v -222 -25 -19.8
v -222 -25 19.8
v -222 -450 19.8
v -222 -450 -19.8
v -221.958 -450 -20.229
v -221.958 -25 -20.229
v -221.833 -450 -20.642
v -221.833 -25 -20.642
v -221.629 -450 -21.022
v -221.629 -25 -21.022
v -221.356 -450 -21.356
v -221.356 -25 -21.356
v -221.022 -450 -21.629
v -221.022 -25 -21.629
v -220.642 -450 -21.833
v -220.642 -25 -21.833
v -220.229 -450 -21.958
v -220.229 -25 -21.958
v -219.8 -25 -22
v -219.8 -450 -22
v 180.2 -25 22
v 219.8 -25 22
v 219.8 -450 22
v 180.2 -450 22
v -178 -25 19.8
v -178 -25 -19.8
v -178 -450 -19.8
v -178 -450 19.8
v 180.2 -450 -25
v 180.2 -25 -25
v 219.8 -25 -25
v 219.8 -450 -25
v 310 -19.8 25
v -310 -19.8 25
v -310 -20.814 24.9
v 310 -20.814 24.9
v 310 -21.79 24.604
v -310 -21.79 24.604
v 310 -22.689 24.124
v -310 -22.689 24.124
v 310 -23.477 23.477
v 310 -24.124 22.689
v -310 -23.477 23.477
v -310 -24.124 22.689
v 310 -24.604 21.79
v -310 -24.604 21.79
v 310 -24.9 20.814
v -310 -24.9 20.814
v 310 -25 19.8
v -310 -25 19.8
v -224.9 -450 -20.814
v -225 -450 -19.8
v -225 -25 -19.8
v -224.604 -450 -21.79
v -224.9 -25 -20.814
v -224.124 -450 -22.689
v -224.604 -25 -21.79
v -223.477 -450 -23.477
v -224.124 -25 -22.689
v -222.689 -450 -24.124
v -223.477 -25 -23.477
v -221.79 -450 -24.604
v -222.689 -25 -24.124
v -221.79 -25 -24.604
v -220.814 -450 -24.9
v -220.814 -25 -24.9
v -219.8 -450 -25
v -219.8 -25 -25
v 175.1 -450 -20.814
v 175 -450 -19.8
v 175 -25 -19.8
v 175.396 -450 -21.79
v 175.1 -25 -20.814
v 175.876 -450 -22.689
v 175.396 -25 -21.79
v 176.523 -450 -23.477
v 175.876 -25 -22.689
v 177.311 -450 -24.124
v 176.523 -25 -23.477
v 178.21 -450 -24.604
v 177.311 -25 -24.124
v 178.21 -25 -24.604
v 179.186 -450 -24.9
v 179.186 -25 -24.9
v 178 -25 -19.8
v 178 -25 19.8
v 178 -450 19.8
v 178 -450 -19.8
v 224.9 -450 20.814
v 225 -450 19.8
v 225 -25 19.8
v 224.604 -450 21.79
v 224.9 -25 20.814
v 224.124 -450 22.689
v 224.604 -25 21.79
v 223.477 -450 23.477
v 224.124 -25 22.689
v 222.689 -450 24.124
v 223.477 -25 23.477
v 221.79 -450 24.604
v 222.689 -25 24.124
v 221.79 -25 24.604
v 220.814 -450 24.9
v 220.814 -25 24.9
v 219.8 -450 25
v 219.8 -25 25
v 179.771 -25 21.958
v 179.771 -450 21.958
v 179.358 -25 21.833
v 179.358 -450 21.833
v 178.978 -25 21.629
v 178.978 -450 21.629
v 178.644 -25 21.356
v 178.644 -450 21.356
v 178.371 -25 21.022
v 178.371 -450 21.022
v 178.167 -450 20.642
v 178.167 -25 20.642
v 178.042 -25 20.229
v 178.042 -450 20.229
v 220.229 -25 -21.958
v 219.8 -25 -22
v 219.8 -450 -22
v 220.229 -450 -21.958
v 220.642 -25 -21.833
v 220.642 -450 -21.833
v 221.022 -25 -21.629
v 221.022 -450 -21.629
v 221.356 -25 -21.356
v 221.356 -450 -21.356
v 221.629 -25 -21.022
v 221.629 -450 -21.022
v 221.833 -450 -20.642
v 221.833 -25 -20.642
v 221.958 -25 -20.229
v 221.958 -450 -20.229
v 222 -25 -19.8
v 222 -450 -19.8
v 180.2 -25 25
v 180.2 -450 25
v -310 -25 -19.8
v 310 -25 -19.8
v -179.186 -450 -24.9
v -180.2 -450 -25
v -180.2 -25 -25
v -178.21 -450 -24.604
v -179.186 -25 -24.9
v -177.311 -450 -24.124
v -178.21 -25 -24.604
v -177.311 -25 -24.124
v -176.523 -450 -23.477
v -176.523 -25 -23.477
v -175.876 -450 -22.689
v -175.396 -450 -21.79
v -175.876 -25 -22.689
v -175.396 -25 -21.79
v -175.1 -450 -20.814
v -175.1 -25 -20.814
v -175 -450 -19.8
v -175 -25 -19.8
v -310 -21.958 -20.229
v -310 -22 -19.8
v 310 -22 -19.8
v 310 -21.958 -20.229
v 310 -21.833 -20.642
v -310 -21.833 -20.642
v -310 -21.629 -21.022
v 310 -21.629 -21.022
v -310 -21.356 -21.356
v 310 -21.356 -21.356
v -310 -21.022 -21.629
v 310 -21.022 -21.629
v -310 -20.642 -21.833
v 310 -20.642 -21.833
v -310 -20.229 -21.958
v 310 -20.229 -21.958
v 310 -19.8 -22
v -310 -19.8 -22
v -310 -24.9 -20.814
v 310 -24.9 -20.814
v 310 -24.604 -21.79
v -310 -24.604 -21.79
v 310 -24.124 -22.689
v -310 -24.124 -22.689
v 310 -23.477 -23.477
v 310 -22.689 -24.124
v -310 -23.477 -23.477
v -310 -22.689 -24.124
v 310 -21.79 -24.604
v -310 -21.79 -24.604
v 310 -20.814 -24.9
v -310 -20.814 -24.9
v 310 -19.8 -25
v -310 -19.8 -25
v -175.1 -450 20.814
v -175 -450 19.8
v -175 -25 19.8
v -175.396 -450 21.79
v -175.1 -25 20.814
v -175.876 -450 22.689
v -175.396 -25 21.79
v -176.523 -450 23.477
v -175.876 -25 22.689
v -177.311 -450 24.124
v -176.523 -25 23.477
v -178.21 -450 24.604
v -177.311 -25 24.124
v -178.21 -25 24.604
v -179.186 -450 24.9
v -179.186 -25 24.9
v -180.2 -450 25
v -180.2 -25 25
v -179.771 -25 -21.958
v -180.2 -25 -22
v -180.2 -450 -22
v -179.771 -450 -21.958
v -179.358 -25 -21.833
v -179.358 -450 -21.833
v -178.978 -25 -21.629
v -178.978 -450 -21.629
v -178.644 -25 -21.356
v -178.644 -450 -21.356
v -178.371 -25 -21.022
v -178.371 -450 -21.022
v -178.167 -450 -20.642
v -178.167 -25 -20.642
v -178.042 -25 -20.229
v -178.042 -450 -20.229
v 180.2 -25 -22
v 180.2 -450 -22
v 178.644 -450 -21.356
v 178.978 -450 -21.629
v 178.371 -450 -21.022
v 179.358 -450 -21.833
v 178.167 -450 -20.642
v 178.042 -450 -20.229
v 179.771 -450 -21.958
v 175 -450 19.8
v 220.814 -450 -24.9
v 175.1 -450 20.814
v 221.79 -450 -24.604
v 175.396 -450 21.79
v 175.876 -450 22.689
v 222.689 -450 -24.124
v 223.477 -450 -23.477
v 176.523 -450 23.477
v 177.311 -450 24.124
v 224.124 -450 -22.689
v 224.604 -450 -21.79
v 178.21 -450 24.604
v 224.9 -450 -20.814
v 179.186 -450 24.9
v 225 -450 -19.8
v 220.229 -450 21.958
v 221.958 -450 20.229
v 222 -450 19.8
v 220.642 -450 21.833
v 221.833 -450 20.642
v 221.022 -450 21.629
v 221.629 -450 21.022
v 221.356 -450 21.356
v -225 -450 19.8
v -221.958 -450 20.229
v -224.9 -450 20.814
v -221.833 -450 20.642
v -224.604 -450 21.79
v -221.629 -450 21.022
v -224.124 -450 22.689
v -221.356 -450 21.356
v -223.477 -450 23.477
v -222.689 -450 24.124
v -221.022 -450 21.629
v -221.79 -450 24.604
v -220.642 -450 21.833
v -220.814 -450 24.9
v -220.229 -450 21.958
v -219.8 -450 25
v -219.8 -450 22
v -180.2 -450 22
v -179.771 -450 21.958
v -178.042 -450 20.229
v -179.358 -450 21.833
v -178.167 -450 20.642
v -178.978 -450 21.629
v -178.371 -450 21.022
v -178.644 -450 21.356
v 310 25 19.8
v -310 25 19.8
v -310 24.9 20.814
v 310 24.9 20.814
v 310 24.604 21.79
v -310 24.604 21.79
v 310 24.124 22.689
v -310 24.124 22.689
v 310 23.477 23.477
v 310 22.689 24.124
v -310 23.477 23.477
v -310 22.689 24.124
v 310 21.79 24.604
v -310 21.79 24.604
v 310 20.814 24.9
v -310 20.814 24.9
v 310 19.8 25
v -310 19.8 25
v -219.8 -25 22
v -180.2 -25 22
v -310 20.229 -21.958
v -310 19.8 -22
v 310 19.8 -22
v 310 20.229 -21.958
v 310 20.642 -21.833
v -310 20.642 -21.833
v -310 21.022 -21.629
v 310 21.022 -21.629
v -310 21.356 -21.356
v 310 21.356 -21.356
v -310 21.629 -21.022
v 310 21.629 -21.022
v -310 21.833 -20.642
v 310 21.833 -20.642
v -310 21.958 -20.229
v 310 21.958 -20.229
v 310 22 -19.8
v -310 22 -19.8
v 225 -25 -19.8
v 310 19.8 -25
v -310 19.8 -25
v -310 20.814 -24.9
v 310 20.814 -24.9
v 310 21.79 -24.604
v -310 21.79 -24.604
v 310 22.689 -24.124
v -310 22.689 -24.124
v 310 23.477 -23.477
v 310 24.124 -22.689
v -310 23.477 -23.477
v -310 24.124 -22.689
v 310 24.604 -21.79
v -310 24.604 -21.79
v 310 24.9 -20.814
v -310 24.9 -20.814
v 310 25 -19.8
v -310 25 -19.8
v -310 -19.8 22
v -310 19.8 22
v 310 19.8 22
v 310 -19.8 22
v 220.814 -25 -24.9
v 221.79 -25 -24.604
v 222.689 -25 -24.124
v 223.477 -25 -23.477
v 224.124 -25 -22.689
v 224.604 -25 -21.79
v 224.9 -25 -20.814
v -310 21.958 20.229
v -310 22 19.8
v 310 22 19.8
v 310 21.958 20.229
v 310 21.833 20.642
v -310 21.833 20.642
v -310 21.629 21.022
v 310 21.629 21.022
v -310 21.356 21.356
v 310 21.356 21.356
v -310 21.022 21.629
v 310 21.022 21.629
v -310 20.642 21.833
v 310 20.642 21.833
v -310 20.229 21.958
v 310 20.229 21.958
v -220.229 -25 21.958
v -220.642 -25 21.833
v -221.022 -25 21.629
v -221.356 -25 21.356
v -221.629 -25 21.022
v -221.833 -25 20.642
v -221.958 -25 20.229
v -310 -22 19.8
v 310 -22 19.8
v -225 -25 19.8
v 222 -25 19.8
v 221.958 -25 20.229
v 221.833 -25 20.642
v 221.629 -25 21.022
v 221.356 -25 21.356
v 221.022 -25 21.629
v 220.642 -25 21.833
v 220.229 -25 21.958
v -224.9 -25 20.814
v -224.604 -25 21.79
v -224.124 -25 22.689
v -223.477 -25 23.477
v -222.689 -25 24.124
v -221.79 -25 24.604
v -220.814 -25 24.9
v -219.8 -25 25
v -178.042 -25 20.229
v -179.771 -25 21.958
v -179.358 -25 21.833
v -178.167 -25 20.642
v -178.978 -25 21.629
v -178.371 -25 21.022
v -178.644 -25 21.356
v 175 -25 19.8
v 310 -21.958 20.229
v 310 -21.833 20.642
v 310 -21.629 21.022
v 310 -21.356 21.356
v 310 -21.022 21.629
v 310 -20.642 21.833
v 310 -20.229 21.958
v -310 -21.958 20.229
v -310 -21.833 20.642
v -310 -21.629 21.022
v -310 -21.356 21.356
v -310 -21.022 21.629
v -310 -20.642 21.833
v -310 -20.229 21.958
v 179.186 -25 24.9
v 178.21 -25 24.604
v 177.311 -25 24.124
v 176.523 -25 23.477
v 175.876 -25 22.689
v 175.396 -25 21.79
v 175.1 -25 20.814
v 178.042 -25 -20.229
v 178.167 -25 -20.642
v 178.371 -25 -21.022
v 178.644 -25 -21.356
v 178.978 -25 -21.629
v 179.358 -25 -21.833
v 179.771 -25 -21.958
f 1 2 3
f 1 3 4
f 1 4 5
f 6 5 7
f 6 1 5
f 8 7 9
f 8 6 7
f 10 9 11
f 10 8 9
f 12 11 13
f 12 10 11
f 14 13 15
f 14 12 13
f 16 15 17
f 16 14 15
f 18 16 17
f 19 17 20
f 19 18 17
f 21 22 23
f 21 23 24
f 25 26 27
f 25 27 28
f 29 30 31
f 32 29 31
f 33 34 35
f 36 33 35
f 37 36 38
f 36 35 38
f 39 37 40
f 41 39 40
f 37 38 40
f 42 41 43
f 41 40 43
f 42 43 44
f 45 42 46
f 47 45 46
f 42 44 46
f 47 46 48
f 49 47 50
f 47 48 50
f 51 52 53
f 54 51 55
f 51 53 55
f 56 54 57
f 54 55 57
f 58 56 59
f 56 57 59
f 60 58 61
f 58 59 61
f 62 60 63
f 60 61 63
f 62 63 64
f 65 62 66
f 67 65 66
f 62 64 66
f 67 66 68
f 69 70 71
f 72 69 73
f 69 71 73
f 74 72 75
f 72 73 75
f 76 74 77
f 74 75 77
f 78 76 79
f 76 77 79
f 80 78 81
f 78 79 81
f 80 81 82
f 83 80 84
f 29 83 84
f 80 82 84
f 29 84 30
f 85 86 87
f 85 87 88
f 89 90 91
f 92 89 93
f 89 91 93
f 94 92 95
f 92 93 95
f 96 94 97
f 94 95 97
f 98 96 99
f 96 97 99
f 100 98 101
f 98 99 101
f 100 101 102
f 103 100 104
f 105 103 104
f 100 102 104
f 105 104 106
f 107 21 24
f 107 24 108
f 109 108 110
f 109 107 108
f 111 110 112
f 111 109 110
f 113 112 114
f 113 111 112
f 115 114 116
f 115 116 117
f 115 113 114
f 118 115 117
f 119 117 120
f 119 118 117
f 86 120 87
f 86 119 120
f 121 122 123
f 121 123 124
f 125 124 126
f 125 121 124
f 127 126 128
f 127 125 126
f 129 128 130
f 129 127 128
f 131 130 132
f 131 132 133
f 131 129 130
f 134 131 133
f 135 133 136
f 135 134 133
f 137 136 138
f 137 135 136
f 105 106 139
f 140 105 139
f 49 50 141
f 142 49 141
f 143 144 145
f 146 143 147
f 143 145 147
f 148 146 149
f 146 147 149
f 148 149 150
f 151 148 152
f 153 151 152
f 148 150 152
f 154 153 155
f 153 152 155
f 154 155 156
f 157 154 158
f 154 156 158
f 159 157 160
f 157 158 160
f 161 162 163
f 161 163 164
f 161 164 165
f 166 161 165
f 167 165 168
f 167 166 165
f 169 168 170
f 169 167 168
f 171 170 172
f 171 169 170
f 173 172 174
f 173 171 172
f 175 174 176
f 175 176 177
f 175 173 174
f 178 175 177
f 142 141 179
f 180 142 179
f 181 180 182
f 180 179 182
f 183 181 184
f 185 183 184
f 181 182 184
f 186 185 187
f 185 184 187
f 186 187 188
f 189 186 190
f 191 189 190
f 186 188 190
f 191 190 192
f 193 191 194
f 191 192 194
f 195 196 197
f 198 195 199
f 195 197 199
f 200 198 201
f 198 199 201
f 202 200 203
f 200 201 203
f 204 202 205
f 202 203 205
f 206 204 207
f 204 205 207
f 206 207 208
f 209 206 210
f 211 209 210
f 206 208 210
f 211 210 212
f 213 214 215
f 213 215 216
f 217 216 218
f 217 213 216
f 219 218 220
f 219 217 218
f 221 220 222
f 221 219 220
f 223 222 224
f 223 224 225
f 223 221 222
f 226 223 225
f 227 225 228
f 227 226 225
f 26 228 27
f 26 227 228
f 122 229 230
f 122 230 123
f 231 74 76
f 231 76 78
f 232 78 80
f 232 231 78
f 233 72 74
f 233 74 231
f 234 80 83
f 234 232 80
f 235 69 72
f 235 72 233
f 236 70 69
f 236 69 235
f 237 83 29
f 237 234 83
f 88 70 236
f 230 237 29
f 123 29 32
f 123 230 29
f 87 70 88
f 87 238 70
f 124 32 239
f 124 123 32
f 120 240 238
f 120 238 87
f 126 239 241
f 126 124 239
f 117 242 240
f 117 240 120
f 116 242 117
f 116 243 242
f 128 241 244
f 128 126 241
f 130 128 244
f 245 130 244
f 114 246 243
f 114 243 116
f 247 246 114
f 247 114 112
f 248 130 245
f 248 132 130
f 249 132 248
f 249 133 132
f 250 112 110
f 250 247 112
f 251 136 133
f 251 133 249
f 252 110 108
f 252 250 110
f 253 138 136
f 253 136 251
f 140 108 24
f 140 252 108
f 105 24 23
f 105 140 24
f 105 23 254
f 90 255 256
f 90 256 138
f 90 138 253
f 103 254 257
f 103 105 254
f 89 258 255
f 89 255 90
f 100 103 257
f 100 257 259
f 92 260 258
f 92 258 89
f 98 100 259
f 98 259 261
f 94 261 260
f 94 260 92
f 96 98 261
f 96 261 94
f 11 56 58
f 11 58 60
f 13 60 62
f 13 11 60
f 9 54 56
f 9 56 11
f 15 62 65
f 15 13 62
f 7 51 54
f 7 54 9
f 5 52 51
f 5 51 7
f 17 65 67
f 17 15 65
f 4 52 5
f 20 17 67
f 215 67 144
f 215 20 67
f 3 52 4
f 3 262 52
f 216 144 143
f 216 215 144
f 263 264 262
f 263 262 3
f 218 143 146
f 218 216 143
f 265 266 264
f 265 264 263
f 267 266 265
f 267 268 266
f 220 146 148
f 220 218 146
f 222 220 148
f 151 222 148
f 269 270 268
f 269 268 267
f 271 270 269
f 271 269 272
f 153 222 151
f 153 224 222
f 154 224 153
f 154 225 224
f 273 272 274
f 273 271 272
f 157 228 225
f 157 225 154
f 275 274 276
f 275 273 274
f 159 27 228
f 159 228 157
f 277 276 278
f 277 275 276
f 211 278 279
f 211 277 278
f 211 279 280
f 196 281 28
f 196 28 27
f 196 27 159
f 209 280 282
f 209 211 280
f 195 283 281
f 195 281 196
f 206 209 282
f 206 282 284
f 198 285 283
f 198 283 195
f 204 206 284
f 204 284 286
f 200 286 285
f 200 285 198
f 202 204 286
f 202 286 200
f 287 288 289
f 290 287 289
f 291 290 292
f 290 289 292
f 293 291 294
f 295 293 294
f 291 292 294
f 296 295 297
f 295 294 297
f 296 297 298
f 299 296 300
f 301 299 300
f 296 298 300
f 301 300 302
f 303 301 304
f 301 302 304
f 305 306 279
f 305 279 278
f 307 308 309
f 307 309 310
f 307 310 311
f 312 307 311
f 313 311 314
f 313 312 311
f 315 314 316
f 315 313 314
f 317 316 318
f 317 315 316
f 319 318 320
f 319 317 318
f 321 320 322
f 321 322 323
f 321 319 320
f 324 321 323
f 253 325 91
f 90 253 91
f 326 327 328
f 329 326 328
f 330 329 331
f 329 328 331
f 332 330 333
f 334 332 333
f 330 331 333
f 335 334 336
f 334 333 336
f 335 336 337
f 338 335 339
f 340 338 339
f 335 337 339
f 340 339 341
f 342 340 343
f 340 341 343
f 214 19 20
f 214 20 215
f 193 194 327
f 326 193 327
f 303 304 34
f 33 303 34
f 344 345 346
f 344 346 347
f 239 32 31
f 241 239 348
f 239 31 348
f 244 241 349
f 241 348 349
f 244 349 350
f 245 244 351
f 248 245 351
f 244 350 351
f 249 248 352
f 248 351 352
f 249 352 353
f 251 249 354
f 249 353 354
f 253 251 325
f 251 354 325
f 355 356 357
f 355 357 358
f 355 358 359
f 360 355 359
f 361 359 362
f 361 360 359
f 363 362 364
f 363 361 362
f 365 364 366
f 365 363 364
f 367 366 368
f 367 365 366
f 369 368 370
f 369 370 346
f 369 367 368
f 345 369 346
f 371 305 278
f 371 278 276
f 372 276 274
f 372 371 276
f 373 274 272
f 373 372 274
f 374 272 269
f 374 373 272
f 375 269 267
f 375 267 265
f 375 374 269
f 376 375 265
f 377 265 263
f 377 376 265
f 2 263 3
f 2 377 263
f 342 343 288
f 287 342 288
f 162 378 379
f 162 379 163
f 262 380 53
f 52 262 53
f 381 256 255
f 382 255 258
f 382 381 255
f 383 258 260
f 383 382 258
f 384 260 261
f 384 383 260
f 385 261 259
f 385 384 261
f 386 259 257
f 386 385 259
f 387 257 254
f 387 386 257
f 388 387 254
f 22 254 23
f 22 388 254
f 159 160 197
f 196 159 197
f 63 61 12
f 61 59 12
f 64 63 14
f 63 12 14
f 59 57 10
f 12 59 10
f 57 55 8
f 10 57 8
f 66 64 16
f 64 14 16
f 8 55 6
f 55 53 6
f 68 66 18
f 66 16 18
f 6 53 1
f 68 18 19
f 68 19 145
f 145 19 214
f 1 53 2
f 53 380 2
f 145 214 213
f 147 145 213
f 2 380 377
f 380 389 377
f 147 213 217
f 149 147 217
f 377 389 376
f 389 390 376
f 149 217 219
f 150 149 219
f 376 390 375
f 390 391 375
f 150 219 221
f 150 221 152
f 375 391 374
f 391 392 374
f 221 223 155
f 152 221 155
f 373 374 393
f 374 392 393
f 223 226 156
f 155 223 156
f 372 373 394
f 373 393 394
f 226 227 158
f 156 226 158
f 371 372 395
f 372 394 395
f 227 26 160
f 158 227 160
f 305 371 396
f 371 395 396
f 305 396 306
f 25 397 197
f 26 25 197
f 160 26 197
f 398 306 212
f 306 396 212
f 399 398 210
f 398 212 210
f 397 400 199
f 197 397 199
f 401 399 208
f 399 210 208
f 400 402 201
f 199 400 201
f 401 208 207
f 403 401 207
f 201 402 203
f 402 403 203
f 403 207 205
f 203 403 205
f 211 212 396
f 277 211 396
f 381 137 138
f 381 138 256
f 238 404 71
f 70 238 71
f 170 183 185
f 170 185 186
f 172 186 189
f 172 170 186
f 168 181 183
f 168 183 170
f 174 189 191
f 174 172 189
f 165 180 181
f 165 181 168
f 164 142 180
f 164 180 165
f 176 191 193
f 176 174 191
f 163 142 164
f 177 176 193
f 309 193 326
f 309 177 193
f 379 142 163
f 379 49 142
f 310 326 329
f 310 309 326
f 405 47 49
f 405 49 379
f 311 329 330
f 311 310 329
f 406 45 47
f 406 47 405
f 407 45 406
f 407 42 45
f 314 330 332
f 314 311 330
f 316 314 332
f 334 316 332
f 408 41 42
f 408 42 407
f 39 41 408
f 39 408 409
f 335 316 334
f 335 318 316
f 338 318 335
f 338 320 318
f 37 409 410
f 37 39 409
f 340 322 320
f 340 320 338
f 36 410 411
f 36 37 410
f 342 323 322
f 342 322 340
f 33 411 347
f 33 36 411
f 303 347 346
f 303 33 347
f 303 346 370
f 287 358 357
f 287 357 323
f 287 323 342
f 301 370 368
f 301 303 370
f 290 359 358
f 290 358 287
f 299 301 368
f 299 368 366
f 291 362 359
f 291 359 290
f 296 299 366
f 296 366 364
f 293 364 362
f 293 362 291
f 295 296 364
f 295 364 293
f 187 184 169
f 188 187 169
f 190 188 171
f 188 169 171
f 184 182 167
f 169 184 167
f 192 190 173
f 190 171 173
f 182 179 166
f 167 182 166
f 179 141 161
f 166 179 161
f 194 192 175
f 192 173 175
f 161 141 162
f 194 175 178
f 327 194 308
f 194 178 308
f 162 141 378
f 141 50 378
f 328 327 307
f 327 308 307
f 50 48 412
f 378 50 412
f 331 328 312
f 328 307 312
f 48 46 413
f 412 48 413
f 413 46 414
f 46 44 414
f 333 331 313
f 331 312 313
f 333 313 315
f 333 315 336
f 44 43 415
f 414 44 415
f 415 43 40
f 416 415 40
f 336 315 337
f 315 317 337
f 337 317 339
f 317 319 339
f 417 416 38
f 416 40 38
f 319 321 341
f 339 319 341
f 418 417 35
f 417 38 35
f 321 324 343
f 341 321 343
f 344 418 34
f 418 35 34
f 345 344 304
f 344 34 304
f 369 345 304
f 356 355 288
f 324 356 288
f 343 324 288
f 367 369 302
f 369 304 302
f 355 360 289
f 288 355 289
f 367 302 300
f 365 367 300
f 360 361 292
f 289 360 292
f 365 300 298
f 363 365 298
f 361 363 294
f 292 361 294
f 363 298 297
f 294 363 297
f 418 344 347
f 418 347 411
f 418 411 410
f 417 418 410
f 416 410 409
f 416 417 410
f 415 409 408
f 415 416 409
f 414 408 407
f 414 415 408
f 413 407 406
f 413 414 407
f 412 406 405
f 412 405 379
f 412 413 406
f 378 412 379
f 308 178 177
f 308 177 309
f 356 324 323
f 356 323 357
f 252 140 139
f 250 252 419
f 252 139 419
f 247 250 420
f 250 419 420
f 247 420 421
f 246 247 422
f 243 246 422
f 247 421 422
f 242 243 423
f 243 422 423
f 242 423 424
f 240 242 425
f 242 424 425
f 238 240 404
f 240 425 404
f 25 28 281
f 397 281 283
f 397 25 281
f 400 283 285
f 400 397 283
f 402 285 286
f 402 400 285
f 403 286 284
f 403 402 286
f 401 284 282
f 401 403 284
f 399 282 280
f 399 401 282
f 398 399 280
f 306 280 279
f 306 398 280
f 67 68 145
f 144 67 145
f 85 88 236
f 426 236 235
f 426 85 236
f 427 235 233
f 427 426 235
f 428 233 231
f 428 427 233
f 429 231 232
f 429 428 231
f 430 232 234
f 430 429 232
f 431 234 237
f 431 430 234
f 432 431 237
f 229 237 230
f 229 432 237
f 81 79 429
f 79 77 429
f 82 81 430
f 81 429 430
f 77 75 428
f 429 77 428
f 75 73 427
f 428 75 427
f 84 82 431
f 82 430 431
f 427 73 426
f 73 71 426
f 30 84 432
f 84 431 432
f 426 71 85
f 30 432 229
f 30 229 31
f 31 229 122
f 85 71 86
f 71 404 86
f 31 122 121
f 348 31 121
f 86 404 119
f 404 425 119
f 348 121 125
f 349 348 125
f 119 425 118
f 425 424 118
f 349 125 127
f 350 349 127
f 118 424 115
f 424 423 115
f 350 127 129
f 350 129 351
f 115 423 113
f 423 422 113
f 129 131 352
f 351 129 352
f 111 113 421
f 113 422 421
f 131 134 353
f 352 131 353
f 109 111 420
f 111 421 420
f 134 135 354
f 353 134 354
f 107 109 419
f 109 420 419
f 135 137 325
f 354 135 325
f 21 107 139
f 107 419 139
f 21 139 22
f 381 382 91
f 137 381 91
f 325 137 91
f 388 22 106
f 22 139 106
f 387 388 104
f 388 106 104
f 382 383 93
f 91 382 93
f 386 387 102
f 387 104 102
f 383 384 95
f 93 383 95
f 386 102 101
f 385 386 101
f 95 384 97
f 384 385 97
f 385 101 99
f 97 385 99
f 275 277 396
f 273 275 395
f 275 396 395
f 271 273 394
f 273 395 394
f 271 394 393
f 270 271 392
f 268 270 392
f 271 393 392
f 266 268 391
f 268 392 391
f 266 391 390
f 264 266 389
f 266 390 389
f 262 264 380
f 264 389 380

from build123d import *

# Parameters (mm, degrees)
F_50X50XT2_50_X_30_X_2_6_1_DEPTH   = 620
F_50X50XT2_50_X_30_X_2_6_1_2_DEPTH = 451
F_50X50XT2_50_X_30_X_2_6_1_3_DEPTH = 451


with BuildPart() as part:
    # Sketch17 → 50x50xt2 50 X 30 X 2.6(1) (new body)
    with BuildSketch(Plane.YZ.offset(-310)):
        with BuildLine():
            Line((-19.8, -25), (19.8, -25))
            ThreePointArc((19.8, -25), (23.476955262, -23.476955262), (25, -19.8))
            Line((25, -19.8), (25, 19.8))
            ThreePointArc((25, 19.8), (23.476955262, 23.476955262), (19.8, 25))
            Line((19.8, 25), (-19.8, 25))
            ThreePointArc((-19.8, 25), (-23.476955262, 23.476955262), (-25, 19.8))
            Line((-25, 19.8), (-25, -19.8))
            ThreePointArc((-25, -19.8), (-23.476955262, -23.476955262), (-19.8, -25))
        make_face()
        with BuildLine():
            Line((-19.8, -22), (19.8, -22))
            ThreePointArc((19.8, -22), (21.355634919, -21.355634919), (22, -19.8))
            Line((22, -19.8), (22, 19.8))
            ThreePointArc((22, 19.8), (21.355634919, 21.355634919), (19.8, 22))
            Line((19.8, 22), (-19.8, 22))
            ThreePointArc((-19.8, 22), (-21.355634919, 21.355634919), (-22, 19.8))
            Line((-22, 19.8), (-22, -19.8))
            ThreePointArc((-22, -19.8), (-21.355634919, -21.355634919), (-19.8, -22))
        make_face(mode=Mode.SUBTRACT)
    extrude(amount=F_50X50XT2_50_X_30_X_2_6_1_DEPTH)


with BuildPart() as body_2:
    # Sketch17 on segment 2 (carried to segment 2) → 50x50xt2 50 X 30 X 2.6_1 2 (new body)
    with BuildSketch(Plane(origin=(-200, 1, 0), x_dir=(1, 0, 0), z_dir=(0, -1, 0))):
        with BuildLine():
            Line((-19.8, -25), (19.8, -25))
            ThreePointArc((19.8, -25), (23.476955262, -23.476955262), (25, -19.8))
            Line((25, -19.8), (25, 19.8))
            ThreePointArc((25, 19.8), (23.476955262, 23.476955262), (19.8, 25))
            Line((19.8, 25), (-19.8, 25))
            ThreePointArc((-19.8, 25), (-23.476955262, 23.476955262), (-25, 19.8))
            Line((-25, 19.8), (-25, -19.8))
            ThreePointArc((-25, -19.8), (-23.476955262, -23.476955262), (-19.8, -25))
        make_face()
        with BuildLine():
            Line((-19.8, -22), (19.8, -22))
            ThreePointArc((19.8, -22), (21.355634919, -21.355634919), (22, -19.8))
            Line((22, -19.8), (22, 19.8))
            ThreePointArc((22, 19.8), (21.355634919, 21.355634919), (19.8, 22))
            Line((19.8, 22), (-19.8, 22))
            ThreePointArc((-19.8, 22), (-21.355634919, 21.355634919), (-22, 19.8))
            Line((-22, 19.8), (-22, -19.8))
            ThreePointArc((-22, -19.8), (-21.355634919, -21.355634919), (-19.8, -22))
        make_face(mode=Mode.SUBTRACT)
    extrude(amount=F_50X50XT2_50_X_30_X_2_6_1_2_DEPTH)

    # 50x50xt2 50 X 30 X 2.6_1 2 end butt 1
    split(bisect_by=Plane(origin=(-200, -25, 0), x_dir=(1, 0, 0), z_dir=(0, -1, 0)), keep=Keep.TOP)


with BuildPart() as body_3:
    # Sketch17 on segment 3 (carried to segment 3) → 50x50xt2 50 X 30 X 2.6_1 3 (new body)
    with BuildSketch(Plane(origin=(200, 1, 0), x_dir=(1, 0, 0), z_dir=(0, -1, 0))):
        with BuildLine():
            Line((-19.8, -25), (19.8, -25))
            ThreePointArc((19.8, -25), (23.476955262, -23.476955262), (25, -19.8))
            Line((25, -19.8), (25, 19.8))
            ThreePointArc((25, 19.8), (23.476955262, 23.476955262), (19.8, 25))
            Line((19.8, 25), (-19.8, 25))
            ThreePointArc((-19.8, 25), (-23.476955262, 23.476955262), (-25, 19.8))
            Line((-25, 19.8), (-25, -19.8))
            ThreePointArc((-25, -19.8), (-23.476955262, -23.476955262), (-19.8, -25))
        make_face()
        with BuildLine():
            Line((-19.8, -22), (19.8, -22))
            ThreePointArc((19.8, -22), (21.355634919, -21.355634919), (22, -19.8))
            Line((22, -19.8), (22, 19.8))
            ThreePointArc((22, 19.8), (21.355634919, 21.355634919), (19.8, 22))
            Line((19.8, 22), (-19.8, 22))
            ThreePointArc((-19.8, 22), (-21.355634919, 21.355634919), (-22, 19.8))
            Line((-22, 19.8), (-22, -19.8))
            ThreePointArc((-22, -19.8), (-21.355634919, -21.355634919), (-19.8, -22))
        make_face(mode=Mode.SUBTRACT)
    extrude(amount=F_50X50XT2_50_X_30_X_2_6_1_3_DEPTH)

    # 50x50xt2 50 X 30 X 2.6_1 3 end butt 1
    split(bisect_by=Plane(origin=(200, -25, 0), x_dir=(1, 0, 0), z_dir=(0, -1, 0)), keep=Keep.TOP)


solid = Compound([part.part, body_2.part, body_3.part])
